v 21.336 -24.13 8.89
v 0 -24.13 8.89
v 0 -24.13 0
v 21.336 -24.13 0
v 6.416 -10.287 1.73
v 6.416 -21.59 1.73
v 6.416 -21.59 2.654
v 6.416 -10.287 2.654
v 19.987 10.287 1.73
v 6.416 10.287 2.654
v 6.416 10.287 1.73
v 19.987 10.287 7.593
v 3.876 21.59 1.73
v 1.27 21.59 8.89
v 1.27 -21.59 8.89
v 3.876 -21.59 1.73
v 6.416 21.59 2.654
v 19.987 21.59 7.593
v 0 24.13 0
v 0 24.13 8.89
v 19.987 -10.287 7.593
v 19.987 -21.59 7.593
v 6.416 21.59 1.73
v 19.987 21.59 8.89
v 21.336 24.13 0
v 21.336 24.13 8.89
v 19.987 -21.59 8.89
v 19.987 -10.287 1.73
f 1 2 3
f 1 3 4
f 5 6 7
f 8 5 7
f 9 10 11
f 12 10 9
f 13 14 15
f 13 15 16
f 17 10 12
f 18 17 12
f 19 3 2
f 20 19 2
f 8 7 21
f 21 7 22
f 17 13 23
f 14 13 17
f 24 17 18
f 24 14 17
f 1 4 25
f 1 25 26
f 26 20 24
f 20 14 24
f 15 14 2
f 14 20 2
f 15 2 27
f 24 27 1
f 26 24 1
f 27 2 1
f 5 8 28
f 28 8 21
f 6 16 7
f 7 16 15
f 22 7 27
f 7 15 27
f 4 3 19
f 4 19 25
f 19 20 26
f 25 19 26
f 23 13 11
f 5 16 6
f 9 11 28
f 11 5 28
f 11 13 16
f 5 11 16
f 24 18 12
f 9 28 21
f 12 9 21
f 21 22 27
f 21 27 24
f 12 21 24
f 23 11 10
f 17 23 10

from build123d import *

# Parameters (mm, degrees)
F0_W     = 21.336
F0_H     = 8.89
F1_DEPTH = 24.13
F3_DEPTH = 21.59
F4_W     = 13.57103
F4_H     = 8.926946
F5_DEPTH = 10.287


with BuildPart() as f1:
    # F0 (on Front) → F1 (new body, symmetric)
    with BuildSketch(Plane.XZ):
        with Locations((10.668, 4.445)):
            Rectangle(F0_W, F0_H)
    extrude(amount=F1_DEPTH, both=True)

    # F2 (on Front) → F3 (cut, symmetric)
    with BuildSketch(Plane.XZ):
        Polygon((19.987223, 8.89), (1.27, 8.89), (3.876193, 1.729542), (6.416193, 1.729542), (6.416193, 2.654027), (19.987223, 7.593478), align=None)
    extrude(amount=F3_DEPTH, both=True, mode=Mode.SUBTRACT)

    # F4 (on Front) → F5 (cut, symmetric)
    with BuildSketch(Plane.XZ):
        with Locations((13.201708, 6.193015)):
            Rectangle(F4_W, F4_H)
    extrude(amount=F5_DEPTH, both=True, mode=Mode.SUBTRACT)


solid = f1.part
